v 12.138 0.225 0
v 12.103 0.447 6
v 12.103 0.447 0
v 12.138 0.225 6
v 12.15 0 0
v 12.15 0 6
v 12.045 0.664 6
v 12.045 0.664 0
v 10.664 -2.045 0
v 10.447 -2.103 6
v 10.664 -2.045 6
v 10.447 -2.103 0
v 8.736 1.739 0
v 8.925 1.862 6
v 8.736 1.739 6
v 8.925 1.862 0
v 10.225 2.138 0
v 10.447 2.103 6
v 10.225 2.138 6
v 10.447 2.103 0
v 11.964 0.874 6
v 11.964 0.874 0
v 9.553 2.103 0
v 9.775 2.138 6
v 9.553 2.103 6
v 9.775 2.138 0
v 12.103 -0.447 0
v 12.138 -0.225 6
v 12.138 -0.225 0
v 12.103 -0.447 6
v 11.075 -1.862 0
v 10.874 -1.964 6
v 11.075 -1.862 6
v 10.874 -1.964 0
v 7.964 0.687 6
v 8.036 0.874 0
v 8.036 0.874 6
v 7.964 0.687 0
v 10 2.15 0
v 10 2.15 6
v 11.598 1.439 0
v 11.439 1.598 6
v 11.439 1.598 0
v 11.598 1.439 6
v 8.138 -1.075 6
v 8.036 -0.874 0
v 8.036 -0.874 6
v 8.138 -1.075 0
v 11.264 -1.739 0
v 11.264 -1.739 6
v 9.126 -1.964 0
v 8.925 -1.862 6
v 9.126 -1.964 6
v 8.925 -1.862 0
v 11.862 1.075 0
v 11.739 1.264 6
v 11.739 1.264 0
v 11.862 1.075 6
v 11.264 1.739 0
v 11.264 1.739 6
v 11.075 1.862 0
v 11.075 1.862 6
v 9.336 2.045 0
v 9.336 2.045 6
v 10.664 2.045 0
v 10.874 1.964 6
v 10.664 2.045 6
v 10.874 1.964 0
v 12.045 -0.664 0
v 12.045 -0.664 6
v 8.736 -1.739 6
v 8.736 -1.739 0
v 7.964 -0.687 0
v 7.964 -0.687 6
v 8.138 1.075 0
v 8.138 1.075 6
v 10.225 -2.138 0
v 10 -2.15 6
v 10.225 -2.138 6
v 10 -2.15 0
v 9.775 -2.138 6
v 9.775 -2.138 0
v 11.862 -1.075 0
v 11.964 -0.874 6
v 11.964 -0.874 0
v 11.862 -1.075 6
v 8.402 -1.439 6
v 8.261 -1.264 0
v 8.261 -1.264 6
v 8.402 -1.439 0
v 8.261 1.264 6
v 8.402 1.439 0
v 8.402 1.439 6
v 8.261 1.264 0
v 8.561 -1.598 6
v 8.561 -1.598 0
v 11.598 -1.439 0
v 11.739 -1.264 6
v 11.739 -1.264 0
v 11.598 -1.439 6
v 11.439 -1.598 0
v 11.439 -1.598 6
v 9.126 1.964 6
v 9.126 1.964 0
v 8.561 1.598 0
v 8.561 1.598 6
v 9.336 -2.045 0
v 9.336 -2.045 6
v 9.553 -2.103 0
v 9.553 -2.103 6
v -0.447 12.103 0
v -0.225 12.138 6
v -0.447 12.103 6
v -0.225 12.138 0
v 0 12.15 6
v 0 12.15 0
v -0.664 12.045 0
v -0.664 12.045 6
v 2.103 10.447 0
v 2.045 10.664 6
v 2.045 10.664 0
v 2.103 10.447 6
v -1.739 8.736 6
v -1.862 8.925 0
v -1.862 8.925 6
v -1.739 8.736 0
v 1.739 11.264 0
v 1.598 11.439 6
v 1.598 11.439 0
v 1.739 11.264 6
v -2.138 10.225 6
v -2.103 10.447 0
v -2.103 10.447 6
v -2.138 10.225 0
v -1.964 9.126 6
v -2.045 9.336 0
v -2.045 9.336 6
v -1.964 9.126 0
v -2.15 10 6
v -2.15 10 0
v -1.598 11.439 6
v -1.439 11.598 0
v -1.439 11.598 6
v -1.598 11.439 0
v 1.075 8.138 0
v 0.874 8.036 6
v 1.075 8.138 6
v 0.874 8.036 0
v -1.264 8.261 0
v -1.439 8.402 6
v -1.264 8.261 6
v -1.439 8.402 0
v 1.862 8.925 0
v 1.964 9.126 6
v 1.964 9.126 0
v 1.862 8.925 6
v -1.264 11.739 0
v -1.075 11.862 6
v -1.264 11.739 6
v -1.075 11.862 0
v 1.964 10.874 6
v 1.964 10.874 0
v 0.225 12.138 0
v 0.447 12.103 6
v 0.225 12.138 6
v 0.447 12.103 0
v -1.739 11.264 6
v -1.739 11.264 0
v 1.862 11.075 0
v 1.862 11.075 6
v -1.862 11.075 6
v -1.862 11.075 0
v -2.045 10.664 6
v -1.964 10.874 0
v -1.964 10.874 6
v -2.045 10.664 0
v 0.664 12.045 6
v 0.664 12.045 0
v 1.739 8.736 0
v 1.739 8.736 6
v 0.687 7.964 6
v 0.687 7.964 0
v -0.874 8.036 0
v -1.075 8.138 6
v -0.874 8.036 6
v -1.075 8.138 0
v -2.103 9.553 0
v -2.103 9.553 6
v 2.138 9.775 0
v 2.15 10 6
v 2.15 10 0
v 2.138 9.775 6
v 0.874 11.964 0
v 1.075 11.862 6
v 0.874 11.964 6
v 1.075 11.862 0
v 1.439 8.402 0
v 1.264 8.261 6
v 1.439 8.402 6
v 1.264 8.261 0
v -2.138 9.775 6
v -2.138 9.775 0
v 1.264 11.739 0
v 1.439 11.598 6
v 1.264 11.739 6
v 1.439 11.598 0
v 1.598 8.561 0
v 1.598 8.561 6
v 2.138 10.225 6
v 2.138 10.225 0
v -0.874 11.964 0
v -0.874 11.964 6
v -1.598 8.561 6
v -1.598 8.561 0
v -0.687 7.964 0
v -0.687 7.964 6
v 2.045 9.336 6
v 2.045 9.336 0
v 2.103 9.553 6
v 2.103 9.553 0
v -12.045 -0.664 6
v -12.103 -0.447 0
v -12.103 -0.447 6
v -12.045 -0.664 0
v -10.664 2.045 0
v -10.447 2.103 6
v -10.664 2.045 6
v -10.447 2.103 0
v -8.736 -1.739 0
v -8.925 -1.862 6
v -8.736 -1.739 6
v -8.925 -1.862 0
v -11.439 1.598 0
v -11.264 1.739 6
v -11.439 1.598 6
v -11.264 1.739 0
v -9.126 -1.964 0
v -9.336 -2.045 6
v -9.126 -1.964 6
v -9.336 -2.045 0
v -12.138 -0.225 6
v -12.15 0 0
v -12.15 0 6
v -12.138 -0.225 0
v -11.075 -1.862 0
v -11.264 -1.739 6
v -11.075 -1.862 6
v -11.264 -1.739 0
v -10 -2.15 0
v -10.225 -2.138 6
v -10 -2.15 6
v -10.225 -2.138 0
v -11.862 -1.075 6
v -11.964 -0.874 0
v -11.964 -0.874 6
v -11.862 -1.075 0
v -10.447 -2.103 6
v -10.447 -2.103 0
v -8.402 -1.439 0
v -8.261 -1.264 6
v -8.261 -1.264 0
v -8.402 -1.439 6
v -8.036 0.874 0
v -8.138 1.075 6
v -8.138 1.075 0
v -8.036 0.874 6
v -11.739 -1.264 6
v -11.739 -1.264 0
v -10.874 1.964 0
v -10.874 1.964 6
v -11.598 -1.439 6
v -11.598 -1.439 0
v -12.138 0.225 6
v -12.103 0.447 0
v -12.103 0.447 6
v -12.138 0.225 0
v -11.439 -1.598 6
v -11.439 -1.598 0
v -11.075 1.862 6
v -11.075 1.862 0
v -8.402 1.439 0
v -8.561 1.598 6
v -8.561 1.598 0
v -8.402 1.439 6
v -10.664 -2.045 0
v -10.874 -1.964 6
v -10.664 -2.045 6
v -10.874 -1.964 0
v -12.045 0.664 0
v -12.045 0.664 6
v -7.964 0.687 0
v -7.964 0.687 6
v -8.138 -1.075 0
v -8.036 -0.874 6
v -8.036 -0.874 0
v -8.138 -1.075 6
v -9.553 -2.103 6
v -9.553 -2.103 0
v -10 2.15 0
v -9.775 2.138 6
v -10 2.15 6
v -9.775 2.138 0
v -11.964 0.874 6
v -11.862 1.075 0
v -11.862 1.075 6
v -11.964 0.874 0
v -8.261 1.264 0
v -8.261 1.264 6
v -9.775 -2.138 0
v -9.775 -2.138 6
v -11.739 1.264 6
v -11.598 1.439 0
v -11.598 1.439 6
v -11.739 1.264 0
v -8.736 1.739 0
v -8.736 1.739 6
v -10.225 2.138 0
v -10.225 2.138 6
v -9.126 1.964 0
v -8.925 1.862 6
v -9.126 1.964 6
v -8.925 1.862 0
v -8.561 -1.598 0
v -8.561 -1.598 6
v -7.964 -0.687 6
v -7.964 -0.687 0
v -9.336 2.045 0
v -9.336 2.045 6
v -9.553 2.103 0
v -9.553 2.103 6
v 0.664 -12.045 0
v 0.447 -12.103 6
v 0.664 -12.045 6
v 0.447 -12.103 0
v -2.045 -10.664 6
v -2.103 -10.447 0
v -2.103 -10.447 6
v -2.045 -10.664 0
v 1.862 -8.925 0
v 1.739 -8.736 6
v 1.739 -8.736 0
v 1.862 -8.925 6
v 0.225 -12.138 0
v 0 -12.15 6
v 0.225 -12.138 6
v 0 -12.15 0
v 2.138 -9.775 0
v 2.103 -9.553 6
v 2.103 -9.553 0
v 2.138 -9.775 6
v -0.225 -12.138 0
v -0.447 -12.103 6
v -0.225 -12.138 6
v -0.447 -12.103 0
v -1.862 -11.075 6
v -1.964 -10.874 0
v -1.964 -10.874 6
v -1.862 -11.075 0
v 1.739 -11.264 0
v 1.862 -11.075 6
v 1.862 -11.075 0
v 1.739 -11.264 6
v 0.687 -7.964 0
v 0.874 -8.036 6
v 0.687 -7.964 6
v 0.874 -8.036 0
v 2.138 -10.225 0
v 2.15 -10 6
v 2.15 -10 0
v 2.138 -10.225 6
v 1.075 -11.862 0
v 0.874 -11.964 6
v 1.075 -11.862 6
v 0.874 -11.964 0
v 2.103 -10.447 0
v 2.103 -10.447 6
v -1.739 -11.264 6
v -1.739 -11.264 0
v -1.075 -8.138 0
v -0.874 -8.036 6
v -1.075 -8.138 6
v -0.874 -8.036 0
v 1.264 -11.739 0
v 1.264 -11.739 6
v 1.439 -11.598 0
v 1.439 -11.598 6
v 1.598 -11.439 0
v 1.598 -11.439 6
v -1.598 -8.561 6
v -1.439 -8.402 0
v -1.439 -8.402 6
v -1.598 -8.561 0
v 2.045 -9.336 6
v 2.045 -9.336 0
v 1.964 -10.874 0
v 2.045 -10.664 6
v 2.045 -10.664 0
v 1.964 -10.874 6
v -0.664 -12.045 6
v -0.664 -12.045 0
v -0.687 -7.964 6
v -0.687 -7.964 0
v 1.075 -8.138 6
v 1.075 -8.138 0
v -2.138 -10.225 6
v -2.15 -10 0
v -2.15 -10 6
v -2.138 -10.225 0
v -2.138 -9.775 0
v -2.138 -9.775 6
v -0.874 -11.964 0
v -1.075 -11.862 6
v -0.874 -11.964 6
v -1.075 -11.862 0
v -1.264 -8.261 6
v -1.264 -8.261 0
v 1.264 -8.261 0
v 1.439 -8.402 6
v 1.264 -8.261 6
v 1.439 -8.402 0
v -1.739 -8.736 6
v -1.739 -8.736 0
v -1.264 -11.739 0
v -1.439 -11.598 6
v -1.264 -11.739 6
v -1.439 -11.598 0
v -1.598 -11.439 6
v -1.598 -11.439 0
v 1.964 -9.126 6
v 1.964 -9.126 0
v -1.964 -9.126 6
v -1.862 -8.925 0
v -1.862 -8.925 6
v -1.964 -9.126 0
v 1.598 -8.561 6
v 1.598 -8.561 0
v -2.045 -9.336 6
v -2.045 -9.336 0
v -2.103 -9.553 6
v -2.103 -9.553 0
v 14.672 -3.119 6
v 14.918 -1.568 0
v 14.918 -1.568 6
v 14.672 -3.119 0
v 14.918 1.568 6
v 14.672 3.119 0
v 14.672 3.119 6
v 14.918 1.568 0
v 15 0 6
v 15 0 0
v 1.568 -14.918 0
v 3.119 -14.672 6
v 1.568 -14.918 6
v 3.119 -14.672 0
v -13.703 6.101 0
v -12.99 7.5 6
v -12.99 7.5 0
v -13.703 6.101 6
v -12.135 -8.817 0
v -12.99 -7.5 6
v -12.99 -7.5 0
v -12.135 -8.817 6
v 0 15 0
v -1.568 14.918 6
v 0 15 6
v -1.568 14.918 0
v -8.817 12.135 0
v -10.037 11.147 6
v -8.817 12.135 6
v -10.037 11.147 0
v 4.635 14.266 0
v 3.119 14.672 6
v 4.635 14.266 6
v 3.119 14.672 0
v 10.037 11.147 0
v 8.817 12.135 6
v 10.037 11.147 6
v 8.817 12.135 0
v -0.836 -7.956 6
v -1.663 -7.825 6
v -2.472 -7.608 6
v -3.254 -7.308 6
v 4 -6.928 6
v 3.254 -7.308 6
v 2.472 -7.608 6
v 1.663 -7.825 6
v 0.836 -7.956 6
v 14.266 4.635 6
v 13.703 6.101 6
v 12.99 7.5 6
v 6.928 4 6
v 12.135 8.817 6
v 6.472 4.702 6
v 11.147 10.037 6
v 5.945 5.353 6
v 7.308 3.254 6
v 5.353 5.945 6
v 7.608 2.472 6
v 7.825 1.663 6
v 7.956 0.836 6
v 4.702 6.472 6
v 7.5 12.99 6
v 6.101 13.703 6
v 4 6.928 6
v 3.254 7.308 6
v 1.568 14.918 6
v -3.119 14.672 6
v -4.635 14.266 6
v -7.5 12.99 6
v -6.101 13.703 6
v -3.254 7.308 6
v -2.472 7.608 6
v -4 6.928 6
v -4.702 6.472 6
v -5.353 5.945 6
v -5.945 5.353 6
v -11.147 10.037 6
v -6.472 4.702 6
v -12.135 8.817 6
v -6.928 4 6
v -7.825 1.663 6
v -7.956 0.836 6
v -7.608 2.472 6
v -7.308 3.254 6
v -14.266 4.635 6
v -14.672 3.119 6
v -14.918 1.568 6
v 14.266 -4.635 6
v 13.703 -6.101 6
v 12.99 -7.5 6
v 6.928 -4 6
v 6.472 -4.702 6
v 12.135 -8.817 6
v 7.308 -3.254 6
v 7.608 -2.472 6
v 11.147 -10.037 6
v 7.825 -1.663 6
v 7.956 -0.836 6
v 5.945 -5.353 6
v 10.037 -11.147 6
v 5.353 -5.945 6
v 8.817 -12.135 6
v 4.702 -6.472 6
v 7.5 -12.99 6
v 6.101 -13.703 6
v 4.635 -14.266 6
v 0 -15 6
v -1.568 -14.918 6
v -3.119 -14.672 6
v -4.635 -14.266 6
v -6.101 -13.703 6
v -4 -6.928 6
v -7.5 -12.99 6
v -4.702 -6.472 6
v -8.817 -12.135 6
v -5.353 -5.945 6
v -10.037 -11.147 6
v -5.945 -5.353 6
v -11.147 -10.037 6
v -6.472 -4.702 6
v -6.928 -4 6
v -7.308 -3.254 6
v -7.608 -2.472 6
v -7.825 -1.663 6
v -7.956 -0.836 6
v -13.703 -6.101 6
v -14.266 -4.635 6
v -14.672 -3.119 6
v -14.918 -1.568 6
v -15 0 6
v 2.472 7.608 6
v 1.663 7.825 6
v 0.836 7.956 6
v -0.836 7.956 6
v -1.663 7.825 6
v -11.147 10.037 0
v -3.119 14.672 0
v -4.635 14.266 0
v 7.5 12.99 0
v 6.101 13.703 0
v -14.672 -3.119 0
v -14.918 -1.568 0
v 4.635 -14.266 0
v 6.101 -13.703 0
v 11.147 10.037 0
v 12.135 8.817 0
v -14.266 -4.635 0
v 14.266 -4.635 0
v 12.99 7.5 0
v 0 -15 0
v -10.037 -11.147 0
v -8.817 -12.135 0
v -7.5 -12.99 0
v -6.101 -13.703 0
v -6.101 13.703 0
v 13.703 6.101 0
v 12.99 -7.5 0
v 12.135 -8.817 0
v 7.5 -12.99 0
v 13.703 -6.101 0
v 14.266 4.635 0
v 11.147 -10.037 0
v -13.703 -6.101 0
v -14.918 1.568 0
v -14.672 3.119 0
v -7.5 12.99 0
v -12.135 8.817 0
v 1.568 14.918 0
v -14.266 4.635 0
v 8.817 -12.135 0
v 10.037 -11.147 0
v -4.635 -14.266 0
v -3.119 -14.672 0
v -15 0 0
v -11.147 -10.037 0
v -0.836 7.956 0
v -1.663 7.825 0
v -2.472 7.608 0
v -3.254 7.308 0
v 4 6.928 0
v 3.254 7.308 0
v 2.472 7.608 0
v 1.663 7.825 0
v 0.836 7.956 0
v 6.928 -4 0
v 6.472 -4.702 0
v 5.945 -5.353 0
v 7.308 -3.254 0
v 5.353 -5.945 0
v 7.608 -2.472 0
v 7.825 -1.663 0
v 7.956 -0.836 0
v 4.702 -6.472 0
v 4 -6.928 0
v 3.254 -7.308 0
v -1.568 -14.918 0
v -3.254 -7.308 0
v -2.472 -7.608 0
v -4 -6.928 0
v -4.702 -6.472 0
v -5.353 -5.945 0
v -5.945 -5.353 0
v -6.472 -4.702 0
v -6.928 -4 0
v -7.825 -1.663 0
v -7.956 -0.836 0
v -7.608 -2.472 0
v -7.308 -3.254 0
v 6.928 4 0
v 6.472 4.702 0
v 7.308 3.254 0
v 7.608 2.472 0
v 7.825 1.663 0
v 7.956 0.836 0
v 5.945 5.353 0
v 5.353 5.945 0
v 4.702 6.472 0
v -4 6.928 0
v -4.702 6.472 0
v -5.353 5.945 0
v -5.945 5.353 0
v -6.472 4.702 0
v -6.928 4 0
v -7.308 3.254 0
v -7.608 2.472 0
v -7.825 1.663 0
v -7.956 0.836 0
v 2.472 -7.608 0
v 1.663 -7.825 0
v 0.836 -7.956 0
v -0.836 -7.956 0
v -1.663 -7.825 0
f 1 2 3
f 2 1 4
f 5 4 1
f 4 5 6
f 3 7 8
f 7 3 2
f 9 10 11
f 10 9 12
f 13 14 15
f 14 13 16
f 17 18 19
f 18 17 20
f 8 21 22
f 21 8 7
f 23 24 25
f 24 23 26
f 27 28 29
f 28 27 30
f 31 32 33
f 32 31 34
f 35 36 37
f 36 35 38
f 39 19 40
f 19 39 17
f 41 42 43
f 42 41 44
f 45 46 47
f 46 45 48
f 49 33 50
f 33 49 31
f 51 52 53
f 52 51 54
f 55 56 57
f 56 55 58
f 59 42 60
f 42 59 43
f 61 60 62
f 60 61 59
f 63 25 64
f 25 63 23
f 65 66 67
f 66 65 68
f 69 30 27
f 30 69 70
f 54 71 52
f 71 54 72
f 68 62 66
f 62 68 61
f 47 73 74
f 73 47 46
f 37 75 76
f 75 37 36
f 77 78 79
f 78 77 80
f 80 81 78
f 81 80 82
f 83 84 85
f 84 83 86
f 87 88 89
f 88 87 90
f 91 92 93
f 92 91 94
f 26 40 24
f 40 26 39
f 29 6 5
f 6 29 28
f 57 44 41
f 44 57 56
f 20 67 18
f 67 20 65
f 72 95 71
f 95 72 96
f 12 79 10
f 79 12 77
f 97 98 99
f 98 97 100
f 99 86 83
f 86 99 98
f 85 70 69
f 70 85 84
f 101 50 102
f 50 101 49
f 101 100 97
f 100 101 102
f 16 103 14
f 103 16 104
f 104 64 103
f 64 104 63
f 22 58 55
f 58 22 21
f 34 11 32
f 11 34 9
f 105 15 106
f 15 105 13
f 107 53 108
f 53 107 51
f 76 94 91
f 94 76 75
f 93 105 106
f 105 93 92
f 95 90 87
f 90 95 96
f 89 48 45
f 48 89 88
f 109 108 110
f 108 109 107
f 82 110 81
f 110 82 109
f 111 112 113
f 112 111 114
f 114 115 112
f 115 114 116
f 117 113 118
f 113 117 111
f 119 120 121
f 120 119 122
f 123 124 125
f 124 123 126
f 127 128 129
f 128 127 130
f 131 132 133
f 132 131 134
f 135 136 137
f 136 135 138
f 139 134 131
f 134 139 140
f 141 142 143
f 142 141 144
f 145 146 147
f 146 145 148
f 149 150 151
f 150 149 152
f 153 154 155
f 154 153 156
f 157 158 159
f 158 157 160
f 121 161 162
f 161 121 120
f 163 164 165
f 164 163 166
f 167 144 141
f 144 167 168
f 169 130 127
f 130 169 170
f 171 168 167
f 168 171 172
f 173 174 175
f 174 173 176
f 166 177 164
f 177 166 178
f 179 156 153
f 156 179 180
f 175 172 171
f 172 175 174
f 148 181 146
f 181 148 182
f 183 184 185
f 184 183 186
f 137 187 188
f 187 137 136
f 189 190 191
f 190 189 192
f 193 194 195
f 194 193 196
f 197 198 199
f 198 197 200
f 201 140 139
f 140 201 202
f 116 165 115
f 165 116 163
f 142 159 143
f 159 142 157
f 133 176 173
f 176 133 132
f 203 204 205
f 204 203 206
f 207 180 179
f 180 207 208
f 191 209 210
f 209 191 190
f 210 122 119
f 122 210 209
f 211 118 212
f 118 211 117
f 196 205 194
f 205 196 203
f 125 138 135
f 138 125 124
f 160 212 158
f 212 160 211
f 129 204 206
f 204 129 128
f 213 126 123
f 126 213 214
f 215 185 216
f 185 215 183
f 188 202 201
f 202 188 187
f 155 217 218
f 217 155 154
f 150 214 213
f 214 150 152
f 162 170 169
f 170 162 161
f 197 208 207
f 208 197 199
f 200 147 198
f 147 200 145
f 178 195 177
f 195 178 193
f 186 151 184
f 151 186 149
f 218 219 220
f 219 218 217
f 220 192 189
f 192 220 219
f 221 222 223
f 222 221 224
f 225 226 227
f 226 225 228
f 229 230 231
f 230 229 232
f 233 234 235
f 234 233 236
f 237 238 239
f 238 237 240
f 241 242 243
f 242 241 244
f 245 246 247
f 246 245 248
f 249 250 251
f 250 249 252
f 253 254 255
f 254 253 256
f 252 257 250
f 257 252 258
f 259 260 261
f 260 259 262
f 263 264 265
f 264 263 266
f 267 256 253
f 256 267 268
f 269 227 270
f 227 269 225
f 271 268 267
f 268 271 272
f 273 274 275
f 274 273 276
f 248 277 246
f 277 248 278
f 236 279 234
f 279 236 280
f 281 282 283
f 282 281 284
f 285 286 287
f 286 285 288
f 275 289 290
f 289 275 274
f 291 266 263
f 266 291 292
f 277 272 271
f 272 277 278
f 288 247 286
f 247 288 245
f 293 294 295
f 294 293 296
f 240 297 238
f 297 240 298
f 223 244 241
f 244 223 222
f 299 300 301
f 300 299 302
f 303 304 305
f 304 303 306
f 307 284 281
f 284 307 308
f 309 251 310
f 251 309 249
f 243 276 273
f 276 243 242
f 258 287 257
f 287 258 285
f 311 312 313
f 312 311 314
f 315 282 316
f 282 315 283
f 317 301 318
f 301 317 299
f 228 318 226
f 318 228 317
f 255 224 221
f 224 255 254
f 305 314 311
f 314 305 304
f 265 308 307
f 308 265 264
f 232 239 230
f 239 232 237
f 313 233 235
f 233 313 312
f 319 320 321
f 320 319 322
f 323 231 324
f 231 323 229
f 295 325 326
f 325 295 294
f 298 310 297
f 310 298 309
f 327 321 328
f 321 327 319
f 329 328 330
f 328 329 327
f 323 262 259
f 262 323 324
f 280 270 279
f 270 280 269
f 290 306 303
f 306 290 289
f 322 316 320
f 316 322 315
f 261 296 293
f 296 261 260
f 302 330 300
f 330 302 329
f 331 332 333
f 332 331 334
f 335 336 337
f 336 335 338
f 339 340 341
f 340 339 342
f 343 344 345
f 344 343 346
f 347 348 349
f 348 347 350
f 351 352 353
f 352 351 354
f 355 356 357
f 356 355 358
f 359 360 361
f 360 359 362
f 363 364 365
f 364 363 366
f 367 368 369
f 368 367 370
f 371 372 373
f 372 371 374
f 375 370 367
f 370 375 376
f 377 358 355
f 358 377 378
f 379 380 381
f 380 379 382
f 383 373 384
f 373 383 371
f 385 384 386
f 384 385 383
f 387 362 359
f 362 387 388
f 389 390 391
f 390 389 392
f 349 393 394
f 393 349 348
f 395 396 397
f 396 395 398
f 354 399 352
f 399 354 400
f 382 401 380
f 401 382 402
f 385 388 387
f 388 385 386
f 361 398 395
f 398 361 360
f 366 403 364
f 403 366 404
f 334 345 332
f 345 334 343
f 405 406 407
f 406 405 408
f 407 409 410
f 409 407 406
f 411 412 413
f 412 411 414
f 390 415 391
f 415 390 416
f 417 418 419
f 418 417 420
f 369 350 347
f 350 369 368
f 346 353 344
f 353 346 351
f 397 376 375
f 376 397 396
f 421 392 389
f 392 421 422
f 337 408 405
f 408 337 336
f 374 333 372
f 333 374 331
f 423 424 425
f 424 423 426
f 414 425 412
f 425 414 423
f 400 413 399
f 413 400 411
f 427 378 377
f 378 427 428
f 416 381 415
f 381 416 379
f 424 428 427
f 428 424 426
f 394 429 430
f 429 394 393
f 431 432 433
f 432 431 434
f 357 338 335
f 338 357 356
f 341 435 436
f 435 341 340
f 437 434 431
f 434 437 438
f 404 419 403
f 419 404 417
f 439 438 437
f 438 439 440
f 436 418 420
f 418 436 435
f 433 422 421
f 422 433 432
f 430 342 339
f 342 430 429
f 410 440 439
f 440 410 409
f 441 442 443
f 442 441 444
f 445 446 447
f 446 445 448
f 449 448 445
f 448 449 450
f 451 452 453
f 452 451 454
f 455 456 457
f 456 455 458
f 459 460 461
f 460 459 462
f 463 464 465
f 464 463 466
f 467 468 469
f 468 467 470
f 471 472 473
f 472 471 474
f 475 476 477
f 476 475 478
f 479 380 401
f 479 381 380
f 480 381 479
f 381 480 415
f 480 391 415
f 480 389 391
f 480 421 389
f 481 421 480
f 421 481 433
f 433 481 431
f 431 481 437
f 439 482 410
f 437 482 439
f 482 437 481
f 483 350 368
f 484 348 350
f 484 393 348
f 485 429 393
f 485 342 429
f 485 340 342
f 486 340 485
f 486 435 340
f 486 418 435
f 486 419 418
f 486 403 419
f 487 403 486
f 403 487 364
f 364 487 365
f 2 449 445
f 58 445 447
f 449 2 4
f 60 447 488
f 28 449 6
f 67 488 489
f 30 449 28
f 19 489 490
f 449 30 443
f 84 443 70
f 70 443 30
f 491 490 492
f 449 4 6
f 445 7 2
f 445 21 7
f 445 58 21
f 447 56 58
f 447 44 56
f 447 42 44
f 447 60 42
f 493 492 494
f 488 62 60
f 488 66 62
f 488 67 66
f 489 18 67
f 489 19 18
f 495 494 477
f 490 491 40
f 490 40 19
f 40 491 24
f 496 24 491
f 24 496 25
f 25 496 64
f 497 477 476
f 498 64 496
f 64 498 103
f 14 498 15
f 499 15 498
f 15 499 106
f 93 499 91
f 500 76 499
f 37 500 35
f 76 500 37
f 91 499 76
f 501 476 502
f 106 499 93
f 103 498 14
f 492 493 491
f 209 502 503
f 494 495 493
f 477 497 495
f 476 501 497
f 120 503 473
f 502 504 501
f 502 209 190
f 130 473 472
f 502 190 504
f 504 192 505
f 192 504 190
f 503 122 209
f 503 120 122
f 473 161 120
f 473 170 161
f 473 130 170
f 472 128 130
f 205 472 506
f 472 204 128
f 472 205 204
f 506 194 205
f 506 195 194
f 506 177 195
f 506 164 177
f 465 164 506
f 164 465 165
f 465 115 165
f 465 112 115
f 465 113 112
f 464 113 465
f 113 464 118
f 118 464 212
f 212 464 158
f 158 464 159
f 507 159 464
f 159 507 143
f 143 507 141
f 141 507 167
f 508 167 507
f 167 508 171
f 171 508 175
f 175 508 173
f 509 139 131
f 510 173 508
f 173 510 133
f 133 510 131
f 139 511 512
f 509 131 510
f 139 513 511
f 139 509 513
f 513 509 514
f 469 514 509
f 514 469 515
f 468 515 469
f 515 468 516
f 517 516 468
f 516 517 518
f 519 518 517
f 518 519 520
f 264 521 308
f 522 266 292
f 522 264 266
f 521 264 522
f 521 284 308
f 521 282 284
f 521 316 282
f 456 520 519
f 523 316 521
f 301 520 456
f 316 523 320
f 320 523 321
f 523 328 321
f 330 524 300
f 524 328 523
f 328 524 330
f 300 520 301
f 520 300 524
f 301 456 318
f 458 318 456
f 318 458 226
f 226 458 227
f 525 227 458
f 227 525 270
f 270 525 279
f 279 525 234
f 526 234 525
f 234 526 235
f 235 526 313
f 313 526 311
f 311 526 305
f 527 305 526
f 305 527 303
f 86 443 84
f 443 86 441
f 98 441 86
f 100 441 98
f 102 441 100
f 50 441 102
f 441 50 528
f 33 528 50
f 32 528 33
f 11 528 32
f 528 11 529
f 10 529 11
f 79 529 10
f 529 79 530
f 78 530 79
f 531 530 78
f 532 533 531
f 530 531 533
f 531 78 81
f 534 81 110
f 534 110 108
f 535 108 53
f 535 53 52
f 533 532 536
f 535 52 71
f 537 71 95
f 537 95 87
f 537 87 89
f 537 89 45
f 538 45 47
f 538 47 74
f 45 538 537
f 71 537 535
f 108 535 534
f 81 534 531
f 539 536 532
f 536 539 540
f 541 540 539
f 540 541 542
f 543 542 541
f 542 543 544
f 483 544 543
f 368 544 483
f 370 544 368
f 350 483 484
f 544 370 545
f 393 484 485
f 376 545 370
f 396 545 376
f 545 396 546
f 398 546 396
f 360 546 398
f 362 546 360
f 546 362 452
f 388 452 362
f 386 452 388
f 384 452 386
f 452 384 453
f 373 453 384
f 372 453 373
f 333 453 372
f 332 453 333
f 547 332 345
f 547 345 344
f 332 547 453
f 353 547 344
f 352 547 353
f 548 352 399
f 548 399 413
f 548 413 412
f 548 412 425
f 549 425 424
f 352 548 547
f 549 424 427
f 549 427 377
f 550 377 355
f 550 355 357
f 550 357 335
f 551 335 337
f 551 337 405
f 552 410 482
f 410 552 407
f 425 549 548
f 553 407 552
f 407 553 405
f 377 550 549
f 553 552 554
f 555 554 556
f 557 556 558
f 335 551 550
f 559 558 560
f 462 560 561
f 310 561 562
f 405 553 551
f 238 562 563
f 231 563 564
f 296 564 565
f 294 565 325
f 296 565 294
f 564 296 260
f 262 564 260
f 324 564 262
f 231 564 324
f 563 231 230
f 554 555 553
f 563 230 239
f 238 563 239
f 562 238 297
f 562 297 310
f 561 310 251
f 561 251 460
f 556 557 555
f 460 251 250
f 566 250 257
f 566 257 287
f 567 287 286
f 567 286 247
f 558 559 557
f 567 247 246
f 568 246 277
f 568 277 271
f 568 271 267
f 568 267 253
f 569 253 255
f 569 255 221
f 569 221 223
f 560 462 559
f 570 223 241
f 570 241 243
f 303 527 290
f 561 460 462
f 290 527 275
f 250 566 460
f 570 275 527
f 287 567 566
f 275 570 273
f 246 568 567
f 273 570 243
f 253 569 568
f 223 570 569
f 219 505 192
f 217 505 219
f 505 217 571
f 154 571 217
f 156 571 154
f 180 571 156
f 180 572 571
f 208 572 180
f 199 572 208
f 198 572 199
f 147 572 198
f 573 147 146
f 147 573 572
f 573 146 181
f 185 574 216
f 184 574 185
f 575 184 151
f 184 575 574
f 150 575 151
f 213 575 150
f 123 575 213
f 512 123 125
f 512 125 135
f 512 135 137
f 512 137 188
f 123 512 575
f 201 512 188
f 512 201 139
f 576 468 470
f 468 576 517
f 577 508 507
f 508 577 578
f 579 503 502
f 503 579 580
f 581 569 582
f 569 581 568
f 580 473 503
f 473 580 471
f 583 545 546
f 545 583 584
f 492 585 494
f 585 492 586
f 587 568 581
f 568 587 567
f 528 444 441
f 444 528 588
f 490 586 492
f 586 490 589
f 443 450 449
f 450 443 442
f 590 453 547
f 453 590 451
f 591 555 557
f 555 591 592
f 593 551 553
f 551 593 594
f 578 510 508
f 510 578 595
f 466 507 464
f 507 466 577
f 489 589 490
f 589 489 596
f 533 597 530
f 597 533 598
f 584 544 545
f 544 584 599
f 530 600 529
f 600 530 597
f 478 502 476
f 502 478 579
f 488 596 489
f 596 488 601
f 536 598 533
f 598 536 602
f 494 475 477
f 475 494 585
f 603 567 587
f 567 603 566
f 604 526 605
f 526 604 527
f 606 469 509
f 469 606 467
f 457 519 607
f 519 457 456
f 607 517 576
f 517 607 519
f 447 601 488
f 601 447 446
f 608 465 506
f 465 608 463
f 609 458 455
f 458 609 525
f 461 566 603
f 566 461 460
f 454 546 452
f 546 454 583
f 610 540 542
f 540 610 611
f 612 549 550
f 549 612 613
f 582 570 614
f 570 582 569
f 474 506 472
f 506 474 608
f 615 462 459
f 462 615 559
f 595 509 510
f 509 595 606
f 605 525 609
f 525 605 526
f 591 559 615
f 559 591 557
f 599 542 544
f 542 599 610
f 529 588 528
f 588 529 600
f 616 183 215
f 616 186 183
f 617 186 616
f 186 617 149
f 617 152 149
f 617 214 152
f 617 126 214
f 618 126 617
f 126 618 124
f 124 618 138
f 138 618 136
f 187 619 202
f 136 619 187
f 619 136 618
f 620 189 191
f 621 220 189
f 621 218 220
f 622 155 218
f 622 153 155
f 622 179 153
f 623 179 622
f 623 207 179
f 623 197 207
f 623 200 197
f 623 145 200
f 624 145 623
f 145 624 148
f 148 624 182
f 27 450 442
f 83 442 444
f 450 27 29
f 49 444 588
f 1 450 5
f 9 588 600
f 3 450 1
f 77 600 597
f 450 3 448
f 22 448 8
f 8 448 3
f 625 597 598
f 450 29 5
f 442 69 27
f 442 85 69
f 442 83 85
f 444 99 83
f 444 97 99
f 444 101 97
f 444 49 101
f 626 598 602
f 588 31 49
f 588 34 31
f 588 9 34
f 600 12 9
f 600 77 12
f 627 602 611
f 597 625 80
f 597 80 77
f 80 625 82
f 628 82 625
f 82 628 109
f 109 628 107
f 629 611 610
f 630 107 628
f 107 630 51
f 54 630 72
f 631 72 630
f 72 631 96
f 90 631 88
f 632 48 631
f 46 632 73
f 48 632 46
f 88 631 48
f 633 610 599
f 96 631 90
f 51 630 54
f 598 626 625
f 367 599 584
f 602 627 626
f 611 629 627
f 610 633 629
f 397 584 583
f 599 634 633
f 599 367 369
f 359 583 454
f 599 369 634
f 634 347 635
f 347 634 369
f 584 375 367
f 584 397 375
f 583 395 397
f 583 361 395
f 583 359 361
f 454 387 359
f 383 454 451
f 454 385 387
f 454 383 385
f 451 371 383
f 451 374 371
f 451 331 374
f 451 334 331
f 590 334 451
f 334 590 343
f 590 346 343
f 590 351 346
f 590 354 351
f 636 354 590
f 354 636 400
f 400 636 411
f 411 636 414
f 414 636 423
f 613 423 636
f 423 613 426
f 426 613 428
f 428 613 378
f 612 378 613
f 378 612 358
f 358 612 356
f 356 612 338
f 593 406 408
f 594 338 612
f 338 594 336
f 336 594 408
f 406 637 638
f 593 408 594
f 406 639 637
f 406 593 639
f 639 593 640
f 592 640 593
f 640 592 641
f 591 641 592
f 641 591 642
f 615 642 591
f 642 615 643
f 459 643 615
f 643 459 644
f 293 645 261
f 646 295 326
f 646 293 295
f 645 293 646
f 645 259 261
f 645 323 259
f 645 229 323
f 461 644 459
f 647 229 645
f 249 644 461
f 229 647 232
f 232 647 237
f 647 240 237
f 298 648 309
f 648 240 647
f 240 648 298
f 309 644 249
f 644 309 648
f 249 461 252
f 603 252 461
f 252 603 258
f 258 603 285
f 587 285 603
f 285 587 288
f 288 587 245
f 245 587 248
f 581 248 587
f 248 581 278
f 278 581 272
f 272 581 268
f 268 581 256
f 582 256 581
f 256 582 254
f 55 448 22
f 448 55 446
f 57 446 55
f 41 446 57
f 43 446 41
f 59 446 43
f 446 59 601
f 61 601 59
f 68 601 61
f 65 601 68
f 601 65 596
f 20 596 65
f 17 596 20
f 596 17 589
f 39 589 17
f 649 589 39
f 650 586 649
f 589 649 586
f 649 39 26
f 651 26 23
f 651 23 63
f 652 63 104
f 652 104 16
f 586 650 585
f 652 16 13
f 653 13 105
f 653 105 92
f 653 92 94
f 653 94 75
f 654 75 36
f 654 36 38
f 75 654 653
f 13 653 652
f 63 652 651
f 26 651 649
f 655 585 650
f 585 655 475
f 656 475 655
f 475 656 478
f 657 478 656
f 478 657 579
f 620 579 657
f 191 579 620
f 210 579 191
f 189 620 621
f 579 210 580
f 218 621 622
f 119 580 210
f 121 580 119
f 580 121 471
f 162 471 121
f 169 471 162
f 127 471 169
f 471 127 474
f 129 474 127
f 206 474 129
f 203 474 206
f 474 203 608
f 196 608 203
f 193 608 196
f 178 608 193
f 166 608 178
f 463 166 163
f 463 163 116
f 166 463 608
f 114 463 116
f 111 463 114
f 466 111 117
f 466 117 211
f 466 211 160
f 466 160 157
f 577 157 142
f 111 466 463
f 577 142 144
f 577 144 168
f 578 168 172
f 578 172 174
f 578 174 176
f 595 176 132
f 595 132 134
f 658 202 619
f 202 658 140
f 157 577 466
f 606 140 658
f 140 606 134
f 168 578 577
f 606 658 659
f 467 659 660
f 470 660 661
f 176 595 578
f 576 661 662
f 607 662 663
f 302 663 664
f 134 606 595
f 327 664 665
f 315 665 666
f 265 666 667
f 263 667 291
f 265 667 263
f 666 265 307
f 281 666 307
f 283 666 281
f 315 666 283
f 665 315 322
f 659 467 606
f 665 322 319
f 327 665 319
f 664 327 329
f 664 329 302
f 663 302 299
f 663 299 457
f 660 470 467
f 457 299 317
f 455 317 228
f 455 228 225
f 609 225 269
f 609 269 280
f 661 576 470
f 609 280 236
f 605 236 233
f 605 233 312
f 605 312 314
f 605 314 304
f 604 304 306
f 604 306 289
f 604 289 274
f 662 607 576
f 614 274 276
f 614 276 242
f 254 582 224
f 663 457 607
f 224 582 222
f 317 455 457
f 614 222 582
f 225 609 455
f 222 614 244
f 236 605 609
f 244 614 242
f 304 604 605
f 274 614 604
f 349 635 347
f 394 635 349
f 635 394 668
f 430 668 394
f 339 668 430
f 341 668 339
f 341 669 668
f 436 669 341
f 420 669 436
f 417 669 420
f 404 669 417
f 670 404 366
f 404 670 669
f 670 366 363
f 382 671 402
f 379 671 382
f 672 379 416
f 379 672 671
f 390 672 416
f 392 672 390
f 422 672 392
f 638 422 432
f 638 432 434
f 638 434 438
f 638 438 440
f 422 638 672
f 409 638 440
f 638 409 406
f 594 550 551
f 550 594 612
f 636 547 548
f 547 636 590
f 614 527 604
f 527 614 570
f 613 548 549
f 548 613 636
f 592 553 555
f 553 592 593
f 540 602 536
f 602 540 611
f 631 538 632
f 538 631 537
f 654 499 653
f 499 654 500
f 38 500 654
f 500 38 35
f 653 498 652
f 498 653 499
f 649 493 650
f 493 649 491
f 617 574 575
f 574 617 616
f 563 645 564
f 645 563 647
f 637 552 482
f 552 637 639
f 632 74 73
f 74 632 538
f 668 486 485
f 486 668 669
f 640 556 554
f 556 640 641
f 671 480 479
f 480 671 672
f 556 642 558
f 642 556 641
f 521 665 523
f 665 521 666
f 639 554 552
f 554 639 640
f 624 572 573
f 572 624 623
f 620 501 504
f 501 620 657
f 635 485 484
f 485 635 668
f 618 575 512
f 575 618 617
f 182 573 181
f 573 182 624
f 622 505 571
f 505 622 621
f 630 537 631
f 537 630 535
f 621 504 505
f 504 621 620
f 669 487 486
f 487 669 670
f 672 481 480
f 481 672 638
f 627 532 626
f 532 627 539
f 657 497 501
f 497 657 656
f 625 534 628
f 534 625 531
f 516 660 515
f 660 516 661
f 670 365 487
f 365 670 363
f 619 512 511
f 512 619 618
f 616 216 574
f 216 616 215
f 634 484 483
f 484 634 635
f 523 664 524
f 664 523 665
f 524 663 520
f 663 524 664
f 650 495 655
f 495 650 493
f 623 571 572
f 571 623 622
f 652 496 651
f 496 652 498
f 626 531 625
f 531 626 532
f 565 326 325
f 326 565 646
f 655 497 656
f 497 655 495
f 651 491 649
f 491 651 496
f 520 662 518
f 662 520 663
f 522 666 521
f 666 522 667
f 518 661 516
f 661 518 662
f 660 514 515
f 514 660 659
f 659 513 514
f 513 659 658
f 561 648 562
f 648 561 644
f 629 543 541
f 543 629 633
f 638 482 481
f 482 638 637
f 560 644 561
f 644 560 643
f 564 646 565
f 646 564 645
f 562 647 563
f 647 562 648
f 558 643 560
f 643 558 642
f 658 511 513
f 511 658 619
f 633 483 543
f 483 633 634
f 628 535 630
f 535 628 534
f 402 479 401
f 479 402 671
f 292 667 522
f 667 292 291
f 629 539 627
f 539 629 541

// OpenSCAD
// Shaft-seal holder plate.
$fn = 60;
eps = 0.02;
seal_d = 16;
outer_d = 30;
plate_t = 6;
difference() { cylinder(d=outer_d,h=plate_t); translate([0,0,-eps]) cylinder(d=seal_d,h=plate_t+2*eps); for(i=[0:3]) rotate([0,0,i*90]) translate([outer_d/2-5,0,-eps]) cylinder(d=4.3,h=plate_t+2*eps); }
